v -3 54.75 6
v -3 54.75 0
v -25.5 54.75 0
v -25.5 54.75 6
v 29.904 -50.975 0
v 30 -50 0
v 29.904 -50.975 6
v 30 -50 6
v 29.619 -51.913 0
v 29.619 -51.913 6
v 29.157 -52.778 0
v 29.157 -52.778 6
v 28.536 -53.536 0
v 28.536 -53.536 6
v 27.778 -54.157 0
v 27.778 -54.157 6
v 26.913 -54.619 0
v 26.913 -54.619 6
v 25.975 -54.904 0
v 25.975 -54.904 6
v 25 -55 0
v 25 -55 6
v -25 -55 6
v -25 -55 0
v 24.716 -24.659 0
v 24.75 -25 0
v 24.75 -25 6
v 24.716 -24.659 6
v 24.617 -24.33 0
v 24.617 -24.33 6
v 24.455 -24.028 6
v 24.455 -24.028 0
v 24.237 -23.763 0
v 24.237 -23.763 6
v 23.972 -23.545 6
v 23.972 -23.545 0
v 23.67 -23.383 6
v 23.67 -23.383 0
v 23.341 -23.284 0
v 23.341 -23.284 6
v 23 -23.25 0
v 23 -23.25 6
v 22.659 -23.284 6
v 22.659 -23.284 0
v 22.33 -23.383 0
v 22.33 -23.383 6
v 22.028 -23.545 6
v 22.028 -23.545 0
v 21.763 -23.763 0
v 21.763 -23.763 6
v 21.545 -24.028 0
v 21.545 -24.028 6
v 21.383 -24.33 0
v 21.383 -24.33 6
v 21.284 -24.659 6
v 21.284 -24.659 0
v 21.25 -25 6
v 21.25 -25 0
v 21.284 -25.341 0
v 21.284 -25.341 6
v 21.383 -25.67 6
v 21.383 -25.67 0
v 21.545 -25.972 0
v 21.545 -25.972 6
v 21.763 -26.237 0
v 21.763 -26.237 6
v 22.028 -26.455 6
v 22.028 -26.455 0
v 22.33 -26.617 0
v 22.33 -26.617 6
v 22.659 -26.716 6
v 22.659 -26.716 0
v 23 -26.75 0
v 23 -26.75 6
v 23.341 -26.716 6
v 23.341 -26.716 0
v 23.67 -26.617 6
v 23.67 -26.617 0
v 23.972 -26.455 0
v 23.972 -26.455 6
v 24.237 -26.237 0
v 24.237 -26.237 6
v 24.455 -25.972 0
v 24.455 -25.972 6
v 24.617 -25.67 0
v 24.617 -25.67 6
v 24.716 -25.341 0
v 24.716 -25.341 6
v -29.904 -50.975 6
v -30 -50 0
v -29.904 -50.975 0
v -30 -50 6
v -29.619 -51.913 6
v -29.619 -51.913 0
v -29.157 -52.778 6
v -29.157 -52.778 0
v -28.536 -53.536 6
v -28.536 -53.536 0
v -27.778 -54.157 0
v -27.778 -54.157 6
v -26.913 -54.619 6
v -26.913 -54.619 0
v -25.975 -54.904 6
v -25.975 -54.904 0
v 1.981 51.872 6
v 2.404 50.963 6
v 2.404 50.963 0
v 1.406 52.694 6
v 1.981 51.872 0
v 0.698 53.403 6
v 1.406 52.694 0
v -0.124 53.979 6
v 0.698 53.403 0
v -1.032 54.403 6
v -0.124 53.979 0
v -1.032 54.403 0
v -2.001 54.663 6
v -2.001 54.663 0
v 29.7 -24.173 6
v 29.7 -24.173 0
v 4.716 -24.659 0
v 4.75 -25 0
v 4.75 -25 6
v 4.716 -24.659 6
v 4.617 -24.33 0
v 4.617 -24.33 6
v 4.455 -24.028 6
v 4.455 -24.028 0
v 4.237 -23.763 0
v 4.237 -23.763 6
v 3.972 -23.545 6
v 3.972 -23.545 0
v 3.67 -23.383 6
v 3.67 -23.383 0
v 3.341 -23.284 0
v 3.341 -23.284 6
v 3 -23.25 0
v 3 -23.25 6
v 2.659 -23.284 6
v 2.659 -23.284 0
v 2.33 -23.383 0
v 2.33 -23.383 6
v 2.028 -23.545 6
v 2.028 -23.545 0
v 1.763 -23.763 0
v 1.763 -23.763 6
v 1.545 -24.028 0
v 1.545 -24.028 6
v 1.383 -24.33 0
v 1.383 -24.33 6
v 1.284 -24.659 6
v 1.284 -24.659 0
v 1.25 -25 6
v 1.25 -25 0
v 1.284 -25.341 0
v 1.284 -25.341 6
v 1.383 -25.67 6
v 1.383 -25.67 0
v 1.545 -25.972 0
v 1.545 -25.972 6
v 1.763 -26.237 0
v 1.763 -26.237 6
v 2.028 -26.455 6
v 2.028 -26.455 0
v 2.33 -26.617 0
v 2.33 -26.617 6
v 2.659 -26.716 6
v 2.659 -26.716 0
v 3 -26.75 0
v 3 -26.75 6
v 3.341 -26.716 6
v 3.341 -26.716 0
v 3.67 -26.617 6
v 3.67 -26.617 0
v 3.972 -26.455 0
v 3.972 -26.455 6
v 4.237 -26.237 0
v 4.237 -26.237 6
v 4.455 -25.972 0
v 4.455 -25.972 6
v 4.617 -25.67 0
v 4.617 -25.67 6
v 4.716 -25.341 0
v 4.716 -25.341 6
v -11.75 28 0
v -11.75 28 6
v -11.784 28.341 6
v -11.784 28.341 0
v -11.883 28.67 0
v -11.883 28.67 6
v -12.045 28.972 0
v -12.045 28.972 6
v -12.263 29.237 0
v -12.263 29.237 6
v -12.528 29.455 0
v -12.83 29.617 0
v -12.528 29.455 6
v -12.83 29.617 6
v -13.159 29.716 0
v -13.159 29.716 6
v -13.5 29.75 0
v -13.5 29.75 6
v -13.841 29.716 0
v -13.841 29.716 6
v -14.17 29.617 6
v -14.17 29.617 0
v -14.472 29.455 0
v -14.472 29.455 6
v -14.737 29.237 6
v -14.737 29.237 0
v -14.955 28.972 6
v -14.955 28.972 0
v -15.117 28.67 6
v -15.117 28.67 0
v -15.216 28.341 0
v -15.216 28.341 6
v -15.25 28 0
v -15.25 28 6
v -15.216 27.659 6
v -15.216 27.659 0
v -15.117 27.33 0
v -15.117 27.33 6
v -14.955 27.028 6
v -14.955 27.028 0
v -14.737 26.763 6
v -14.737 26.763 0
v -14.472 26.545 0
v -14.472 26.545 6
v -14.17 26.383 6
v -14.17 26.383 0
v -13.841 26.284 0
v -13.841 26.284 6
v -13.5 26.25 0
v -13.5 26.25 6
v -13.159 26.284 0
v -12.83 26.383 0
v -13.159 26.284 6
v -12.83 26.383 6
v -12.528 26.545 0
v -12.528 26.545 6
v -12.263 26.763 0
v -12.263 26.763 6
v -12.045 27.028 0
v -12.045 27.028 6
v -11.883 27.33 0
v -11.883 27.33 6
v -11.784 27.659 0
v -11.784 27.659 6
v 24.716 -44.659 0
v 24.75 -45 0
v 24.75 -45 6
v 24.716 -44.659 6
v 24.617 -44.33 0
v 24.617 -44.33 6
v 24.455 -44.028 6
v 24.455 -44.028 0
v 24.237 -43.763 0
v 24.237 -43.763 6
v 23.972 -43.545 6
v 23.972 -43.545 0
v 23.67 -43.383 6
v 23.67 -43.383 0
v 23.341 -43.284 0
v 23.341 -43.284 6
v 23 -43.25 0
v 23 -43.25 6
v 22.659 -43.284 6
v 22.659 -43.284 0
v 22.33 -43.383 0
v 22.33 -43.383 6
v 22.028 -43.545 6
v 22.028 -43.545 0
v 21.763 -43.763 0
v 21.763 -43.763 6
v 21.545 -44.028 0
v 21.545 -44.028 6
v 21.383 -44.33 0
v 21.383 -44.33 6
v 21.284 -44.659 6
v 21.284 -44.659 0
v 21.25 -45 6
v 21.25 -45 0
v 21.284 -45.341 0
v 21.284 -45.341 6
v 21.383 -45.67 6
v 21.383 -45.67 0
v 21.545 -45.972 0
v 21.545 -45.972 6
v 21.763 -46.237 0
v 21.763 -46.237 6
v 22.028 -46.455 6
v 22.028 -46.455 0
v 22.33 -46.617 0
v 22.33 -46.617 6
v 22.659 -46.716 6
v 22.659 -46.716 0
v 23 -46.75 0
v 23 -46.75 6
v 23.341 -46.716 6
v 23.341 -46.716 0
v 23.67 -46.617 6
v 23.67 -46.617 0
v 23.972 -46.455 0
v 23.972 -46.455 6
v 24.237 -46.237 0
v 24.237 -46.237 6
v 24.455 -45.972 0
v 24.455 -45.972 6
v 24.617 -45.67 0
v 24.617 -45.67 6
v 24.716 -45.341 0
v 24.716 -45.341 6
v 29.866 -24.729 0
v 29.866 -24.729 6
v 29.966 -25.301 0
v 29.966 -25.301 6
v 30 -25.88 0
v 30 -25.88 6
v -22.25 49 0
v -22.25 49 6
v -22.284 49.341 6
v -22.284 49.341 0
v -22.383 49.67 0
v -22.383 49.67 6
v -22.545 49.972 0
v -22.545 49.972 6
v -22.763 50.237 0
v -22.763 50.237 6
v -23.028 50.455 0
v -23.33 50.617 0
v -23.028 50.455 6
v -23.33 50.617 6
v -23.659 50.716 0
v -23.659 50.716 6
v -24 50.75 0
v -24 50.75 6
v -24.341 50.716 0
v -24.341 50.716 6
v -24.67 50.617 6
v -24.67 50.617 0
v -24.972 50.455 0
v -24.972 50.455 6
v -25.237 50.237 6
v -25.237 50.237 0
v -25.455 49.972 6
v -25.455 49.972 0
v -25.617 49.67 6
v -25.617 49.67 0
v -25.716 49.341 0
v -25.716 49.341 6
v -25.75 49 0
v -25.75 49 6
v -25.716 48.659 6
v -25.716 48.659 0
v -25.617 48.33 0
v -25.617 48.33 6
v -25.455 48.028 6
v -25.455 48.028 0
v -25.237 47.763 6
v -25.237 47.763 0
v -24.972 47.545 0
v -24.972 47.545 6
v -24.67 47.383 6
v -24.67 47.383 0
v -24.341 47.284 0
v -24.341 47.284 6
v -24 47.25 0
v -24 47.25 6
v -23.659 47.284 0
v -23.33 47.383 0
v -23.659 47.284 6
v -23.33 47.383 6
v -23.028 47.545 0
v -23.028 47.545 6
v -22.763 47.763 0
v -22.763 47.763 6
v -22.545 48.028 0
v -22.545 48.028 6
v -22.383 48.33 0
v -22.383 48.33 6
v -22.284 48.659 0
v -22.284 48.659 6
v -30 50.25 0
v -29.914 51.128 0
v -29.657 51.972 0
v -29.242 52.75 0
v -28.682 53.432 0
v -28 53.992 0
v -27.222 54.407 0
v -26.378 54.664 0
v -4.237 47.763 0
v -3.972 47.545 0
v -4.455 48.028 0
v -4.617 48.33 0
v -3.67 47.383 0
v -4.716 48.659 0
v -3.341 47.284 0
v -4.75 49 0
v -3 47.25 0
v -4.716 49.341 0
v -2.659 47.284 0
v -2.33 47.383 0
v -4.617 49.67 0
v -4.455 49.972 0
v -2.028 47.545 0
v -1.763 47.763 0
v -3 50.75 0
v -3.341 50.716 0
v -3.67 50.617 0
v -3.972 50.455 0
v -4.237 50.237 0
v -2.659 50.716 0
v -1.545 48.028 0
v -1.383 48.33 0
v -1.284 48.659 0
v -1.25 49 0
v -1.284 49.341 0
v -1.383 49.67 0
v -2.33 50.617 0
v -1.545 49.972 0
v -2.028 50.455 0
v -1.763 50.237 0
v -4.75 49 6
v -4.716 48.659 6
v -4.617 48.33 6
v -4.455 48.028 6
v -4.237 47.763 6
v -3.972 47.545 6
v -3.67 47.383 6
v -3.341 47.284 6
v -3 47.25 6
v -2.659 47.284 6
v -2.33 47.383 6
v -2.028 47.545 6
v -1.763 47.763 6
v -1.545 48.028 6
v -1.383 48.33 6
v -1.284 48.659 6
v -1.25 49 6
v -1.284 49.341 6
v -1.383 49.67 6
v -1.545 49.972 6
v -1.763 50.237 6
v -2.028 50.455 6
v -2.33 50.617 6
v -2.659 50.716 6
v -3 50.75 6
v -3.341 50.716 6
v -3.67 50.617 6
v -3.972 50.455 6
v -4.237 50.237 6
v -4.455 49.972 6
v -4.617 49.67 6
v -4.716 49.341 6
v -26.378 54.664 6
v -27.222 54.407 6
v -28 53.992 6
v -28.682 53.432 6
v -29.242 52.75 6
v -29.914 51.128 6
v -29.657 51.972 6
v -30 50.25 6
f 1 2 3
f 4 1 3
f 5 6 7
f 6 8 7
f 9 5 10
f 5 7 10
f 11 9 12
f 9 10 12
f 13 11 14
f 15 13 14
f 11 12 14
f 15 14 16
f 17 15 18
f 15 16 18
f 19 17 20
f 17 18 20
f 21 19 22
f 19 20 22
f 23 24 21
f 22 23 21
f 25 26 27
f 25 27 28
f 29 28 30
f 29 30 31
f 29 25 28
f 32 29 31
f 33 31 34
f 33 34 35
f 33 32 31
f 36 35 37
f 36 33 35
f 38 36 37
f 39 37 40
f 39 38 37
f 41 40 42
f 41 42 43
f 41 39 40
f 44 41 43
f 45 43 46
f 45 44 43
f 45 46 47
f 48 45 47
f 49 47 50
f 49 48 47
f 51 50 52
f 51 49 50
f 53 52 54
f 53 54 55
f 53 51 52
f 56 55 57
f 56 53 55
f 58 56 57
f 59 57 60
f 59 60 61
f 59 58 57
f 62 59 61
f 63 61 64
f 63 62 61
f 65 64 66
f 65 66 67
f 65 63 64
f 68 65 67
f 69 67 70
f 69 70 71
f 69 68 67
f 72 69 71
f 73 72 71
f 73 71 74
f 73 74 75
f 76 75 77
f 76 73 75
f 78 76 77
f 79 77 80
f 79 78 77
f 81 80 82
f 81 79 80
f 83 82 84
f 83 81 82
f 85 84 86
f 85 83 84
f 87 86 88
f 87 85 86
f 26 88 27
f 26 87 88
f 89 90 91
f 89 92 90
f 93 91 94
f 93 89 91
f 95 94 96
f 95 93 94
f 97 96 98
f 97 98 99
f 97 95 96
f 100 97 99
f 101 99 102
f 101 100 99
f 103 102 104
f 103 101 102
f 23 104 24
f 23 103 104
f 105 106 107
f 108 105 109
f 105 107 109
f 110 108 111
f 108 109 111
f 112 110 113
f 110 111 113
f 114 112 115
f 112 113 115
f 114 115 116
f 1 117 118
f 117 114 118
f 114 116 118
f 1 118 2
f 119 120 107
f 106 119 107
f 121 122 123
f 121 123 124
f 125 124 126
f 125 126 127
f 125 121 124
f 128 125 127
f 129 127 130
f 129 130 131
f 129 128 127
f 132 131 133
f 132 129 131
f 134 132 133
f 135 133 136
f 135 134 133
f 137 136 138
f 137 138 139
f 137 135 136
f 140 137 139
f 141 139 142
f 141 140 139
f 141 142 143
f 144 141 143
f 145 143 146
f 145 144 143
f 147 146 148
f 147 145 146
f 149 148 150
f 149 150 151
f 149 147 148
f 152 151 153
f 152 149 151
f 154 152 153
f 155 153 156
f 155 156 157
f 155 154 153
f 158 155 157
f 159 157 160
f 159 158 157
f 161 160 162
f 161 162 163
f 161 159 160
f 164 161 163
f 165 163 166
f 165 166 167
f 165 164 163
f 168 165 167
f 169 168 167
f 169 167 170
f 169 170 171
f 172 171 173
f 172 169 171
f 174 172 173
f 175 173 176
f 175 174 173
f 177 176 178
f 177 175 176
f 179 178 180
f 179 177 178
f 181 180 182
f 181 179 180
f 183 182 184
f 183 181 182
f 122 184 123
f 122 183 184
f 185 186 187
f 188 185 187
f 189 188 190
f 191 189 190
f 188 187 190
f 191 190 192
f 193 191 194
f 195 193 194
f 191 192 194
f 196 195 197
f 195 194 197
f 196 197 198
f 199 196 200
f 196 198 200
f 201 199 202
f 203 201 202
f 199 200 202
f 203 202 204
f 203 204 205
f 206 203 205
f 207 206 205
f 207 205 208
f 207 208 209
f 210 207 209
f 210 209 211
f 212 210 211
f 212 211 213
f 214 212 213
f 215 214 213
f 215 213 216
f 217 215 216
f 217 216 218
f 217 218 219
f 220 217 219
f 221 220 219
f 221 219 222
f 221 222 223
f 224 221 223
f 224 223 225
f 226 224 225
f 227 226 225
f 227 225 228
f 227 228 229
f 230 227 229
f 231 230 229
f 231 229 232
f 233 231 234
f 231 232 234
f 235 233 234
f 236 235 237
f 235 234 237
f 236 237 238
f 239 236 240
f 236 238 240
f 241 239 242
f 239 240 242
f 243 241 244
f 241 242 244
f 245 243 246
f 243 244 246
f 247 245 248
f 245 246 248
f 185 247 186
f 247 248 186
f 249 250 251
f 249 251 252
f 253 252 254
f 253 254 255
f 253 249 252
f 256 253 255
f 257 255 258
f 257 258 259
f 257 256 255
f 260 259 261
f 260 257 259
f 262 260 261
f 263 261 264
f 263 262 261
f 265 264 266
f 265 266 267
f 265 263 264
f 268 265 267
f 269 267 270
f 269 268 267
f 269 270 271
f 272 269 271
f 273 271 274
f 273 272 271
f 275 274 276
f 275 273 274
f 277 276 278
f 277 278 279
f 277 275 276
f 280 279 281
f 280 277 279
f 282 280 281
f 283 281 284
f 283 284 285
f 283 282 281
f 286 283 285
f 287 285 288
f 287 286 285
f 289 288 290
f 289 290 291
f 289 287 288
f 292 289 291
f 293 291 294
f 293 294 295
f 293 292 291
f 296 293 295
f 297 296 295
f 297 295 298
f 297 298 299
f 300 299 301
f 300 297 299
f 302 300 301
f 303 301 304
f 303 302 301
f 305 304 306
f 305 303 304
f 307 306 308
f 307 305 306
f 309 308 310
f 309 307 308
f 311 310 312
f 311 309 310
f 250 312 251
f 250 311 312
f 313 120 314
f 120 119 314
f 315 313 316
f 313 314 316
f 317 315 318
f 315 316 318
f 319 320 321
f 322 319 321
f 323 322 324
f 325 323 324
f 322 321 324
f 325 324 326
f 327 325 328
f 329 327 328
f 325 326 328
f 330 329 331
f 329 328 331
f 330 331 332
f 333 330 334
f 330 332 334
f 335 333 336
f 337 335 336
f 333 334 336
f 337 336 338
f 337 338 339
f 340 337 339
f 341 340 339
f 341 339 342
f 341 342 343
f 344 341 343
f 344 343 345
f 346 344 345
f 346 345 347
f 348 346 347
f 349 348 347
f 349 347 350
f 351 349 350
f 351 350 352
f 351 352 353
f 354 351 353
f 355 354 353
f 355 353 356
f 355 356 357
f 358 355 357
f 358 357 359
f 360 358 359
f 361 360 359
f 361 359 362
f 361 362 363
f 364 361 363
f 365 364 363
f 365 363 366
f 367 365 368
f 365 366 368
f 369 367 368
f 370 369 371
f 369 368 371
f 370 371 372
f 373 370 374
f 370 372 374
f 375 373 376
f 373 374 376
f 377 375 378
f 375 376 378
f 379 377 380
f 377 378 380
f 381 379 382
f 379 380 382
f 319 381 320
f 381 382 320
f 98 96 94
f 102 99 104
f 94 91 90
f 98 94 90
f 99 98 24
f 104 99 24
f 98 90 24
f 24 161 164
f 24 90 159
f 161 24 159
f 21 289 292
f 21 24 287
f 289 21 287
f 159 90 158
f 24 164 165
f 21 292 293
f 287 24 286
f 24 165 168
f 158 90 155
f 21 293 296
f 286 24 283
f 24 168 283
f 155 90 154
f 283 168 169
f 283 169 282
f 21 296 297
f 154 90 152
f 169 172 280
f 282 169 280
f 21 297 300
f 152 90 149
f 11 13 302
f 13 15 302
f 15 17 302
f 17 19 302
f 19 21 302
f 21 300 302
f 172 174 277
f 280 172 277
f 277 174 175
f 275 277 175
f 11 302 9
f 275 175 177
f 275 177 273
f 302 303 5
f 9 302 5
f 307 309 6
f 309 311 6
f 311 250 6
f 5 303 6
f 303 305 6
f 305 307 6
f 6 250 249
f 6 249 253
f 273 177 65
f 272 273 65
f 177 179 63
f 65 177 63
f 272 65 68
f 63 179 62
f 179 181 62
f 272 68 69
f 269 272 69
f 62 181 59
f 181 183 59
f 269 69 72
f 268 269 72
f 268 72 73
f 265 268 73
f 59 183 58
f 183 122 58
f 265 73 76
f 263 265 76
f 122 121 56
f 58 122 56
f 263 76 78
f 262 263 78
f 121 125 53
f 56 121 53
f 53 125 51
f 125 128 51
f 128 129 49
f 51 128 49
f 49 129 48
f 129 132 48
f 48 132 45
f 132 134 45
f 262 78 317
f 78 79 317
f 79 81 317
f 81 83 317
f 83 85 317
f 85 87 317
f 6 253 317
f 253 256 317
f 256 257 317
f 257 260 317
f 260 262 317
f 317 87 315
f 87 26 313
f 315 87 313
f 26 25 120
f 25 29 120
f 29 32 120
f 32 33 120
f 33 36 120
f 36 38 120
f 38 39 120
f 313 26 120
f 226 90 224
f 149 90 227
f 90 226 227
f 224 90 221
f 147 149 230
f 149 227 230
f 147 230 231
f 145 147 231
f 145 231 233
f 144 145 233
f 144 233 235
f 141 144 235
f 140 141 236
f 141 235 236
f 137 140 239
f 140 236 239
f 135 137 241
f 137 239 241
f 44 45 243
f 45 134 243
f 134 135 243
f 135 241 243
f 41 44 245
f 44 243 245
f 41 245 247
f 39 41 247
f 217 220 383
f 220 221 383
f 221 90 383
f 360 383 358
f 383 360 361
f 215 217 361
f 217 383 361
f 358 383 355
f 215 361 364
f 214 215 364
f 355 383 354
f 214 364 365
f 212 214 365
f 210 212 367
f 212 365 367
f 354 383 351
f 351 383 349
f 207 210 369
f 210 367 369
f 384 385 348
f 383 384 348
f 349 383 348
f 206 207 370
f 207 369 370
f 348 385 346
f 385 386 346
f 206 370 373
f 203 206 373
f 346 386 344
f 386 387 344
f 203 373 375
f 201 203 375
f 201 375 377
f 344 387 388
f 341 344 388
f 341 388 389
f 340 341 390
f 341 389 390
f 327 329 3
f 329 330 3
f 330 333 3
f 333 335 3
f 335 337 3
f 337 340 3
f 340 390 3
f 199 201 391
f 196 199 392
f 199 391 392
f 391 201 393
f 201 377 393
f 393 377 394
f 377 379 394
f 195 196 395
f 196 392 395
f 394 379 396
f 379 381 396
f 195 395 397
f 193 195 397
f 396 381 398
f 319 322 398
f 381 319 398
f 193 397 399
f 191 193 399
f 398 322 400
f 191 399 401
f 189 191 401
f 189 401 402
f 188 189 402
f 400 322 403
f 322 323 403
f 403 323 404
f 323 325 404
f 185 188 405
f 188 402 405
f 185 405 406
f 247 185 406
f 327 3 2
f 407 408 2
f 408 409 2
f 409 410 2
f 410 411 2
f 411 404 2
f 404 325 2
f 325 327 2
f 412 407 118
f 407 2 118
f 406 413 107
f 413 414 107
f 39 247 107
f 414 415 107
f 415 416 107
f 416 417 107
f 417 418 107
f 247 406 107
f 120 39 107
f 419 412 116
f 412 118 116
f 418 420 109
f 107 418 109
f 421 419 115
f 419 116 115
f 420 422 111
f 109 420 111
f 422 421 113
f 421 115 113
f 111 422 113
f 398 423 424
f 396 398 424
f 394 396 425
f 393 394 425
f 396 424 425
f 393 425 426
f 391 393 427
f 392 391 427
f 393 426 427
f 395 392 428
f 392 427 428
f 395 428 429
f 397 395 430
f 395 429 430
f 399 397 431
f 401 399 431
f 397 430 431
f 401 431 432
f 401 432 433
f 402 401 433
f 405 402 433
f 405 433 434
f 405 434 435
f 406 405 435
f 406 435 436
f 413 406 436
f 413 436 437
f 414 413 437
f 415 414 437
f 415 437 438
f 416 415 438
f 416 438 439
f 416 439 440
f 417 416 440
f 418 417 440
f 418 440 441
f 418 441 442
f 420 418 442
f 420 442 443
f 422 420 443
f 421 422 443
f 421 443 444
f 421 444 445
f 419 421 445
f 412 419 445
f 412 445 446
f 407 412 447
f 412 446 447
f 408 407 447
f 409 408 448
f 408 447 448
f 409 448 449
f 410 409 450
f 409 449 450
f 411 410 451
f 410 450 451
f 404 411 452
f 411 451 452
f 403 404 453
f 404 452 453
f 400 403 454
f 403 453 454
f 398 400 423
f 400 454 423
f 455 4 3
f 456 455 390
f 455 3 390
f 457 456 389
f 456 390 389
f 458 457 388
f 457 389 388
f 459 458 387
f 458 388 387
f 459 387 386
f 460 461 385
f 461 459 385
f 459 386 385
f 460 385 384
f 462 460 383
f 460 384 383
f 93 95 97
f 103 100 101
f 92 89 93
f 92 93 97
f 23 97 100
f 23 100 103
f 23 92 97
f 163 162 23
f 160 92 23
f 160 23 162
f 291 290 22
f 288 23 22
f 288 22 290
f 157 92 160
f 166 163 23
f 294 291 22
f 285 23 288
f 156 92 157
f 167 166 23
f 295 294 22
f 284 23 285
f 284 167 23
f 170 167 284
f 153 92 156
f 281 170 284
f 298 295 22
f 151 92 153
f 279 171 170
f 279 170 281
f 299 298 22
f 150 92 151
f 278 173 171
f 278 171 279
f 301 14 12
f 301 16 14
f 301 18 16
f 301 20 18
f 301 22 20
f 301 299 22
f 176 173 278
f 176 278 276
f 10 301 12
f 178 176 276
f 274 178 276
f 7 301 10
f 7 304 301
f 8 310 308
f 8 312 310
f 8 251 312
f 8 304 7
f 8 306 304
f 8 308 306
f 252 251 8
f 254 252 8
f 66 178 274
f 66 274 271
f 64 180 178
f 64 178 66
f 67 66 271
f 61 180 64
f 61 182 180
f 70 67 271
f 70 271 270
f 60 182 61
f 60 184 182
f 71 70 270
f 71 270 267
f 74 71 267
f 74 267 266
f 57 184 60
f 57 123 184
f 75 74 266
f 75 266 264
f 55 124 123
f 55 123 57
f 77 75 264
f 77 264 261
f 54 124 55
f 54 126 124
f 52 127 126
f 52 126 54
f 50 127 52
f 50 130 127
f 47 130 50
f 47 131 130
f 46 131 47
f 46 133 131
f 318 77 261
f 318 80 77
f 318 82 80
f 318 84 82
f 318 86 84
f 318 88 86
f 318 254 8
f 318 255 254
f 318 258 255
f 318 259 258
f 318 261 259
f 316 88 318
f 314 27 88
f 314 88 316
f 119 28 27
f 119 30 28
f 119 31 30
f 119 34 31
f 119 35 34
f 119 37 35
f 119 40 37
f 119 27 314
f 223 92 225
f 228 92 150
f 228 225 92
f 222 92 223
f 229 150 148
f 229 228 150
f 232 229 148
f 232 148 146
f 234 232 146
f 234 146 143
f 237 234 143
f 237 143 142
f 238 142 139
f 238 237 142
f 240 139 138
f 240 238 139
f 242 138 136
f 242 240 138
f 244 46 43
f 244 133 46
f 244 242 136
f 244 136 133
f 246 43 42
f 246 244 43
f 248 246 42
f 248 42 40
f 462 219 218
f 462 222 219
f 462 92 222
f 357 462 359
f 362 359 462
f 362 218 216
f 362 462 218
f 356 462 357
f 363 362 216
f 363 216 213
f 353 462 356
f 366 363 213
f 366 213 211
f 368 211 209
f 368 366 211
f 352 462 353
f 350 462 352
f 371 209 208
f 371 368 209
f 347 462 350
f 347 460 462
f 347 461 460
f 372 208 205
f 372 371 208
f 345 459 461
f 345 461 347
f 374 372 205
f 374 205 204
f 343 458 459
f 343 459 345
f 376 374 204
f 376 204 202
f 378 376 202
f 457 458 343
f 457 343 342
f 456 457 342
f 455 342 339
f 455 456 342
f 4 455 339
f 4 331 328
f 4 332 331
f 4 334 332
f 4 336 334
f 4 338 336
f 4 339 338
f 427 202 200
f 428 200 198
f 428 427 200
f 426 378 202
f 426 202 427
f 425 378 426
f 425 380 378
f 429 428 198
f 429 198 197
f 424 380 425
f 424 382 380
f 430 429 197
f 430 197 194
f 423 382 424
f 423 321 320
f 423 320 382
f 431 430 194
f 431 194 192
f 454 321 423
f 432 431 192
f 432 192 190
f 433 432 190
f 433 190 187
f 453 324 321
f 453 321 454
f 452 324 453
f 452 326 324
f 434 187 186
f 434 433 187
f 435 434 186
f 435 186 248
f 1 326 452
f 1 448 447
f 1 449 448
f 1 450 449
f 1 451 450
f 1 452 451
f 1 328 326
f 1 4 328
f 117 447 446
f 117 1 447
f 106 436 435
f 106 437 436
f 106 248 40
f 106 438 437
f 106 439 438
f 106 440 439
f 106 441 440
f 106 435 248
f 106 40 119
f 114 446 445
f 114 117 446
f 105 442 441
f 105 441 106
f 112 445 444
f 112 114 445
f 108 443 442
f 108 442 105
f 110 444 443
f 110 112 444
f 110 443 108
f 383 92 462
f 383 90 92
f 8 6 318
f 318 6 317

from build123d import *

# Parameters (mm, degrees)
ESBO_O1_W                = 60
ESBO_O1_H                = 110
ESBO_O1_R                = 1.75
RESSALTO_EXTRUS_O1_DEPTH = 6
ESBO_O2_R                = 1.75
CORTE_EXTRUS_O1_DEPTH    = 63.93647591
CORTE_EXTRUS_O3_DEPTH    = 63.93647591
FILETE1_R                = 5


with BuildPart() as part:
    # Esboço1 → Ressalto-extrusão1 (new body)
    with BuildSketch(Plane.XY):
        Rectangle(ESBO_O1_W, ESBO_O1_H)
        with Locations((23, -45)):
            Circle(ESBO_O1_R, mode=Mode.SUBTRACT)
        with Locations((23, -25)):
            Circle(ESBO_O1_R, mode=Mode.SUBTRACT)
        with Locations((3, -25)):
            Circle(ESBO_O1_R, mode=Mode.SUBTRACT)
    extrude(amount=RESSALTO_EXTRUS_O1_DEPTH)

    # Esboço2 → Corte-extrusão1 (cut, through all)
    with BuildSketch(Plane.XY.offset(6)):
        with Locations((-24, 49)):
            Circle(ESBO_O2_R)
        with Locations(Location((-3, 49, 0), (0, 0, 180))):
            Circle(ESBO_O2_R)
        with Locations((-13.5, 28)):
            Circle(ESBO_O2_R)
    extrude(amount=-CORTE_EXTRUS_O1_DEPTH, mode=Mode.SUBTRACT)

    # Esboço4 → Corte-extrusão3 (cut, through all)
    with BuildSketch(Plane(origin=(0, 0, 0), x_dir=(-1, 0, 0), z_dir=(0, 0, -1))):
        with BuildLine():
            Line((3, 54.75), (25.5, 54.75))
            ThreePointArc((25.5, 54.75), (28.681980515, 53.431980515), (30, 50.25))
            Line((30, 50.25), (30, 18.54785582))
            Line((30, 18.54785582), (51.213466558, 18.54785582))
            Line((51.213466558, 18.54785582), (51.213466558, 63.658711058))
            Line((51.213466558, 63.658711058), (-45.570141277, 63.658711058))
            Line((-45.570141277, 63.658711058), (-45.570141277, -25))
            Line((-45.570141277, -25), (-30, -25))
            Line((-30, -25), (-2.404439279, 50.963297246))
            ThreePointArc((-2.404439279, 50.963297246), (-0.299510633, 53.709111337), (3, 54.75))
        make_face()
    extrude(amount=-CORTE_EXTRUS_O3_DEPTH, mode=Mode.SUBTRACT)

    # Filete1
    filete1_edges = [part.edges().sort_by_distance(p)[0] for p in [
        (30, -25, 3),
        (30, -55, 3),
        (-30, -55, 3),
    ]]
    fillet(filete1_edges, radius=FILETE1_R)


solid = part.part
